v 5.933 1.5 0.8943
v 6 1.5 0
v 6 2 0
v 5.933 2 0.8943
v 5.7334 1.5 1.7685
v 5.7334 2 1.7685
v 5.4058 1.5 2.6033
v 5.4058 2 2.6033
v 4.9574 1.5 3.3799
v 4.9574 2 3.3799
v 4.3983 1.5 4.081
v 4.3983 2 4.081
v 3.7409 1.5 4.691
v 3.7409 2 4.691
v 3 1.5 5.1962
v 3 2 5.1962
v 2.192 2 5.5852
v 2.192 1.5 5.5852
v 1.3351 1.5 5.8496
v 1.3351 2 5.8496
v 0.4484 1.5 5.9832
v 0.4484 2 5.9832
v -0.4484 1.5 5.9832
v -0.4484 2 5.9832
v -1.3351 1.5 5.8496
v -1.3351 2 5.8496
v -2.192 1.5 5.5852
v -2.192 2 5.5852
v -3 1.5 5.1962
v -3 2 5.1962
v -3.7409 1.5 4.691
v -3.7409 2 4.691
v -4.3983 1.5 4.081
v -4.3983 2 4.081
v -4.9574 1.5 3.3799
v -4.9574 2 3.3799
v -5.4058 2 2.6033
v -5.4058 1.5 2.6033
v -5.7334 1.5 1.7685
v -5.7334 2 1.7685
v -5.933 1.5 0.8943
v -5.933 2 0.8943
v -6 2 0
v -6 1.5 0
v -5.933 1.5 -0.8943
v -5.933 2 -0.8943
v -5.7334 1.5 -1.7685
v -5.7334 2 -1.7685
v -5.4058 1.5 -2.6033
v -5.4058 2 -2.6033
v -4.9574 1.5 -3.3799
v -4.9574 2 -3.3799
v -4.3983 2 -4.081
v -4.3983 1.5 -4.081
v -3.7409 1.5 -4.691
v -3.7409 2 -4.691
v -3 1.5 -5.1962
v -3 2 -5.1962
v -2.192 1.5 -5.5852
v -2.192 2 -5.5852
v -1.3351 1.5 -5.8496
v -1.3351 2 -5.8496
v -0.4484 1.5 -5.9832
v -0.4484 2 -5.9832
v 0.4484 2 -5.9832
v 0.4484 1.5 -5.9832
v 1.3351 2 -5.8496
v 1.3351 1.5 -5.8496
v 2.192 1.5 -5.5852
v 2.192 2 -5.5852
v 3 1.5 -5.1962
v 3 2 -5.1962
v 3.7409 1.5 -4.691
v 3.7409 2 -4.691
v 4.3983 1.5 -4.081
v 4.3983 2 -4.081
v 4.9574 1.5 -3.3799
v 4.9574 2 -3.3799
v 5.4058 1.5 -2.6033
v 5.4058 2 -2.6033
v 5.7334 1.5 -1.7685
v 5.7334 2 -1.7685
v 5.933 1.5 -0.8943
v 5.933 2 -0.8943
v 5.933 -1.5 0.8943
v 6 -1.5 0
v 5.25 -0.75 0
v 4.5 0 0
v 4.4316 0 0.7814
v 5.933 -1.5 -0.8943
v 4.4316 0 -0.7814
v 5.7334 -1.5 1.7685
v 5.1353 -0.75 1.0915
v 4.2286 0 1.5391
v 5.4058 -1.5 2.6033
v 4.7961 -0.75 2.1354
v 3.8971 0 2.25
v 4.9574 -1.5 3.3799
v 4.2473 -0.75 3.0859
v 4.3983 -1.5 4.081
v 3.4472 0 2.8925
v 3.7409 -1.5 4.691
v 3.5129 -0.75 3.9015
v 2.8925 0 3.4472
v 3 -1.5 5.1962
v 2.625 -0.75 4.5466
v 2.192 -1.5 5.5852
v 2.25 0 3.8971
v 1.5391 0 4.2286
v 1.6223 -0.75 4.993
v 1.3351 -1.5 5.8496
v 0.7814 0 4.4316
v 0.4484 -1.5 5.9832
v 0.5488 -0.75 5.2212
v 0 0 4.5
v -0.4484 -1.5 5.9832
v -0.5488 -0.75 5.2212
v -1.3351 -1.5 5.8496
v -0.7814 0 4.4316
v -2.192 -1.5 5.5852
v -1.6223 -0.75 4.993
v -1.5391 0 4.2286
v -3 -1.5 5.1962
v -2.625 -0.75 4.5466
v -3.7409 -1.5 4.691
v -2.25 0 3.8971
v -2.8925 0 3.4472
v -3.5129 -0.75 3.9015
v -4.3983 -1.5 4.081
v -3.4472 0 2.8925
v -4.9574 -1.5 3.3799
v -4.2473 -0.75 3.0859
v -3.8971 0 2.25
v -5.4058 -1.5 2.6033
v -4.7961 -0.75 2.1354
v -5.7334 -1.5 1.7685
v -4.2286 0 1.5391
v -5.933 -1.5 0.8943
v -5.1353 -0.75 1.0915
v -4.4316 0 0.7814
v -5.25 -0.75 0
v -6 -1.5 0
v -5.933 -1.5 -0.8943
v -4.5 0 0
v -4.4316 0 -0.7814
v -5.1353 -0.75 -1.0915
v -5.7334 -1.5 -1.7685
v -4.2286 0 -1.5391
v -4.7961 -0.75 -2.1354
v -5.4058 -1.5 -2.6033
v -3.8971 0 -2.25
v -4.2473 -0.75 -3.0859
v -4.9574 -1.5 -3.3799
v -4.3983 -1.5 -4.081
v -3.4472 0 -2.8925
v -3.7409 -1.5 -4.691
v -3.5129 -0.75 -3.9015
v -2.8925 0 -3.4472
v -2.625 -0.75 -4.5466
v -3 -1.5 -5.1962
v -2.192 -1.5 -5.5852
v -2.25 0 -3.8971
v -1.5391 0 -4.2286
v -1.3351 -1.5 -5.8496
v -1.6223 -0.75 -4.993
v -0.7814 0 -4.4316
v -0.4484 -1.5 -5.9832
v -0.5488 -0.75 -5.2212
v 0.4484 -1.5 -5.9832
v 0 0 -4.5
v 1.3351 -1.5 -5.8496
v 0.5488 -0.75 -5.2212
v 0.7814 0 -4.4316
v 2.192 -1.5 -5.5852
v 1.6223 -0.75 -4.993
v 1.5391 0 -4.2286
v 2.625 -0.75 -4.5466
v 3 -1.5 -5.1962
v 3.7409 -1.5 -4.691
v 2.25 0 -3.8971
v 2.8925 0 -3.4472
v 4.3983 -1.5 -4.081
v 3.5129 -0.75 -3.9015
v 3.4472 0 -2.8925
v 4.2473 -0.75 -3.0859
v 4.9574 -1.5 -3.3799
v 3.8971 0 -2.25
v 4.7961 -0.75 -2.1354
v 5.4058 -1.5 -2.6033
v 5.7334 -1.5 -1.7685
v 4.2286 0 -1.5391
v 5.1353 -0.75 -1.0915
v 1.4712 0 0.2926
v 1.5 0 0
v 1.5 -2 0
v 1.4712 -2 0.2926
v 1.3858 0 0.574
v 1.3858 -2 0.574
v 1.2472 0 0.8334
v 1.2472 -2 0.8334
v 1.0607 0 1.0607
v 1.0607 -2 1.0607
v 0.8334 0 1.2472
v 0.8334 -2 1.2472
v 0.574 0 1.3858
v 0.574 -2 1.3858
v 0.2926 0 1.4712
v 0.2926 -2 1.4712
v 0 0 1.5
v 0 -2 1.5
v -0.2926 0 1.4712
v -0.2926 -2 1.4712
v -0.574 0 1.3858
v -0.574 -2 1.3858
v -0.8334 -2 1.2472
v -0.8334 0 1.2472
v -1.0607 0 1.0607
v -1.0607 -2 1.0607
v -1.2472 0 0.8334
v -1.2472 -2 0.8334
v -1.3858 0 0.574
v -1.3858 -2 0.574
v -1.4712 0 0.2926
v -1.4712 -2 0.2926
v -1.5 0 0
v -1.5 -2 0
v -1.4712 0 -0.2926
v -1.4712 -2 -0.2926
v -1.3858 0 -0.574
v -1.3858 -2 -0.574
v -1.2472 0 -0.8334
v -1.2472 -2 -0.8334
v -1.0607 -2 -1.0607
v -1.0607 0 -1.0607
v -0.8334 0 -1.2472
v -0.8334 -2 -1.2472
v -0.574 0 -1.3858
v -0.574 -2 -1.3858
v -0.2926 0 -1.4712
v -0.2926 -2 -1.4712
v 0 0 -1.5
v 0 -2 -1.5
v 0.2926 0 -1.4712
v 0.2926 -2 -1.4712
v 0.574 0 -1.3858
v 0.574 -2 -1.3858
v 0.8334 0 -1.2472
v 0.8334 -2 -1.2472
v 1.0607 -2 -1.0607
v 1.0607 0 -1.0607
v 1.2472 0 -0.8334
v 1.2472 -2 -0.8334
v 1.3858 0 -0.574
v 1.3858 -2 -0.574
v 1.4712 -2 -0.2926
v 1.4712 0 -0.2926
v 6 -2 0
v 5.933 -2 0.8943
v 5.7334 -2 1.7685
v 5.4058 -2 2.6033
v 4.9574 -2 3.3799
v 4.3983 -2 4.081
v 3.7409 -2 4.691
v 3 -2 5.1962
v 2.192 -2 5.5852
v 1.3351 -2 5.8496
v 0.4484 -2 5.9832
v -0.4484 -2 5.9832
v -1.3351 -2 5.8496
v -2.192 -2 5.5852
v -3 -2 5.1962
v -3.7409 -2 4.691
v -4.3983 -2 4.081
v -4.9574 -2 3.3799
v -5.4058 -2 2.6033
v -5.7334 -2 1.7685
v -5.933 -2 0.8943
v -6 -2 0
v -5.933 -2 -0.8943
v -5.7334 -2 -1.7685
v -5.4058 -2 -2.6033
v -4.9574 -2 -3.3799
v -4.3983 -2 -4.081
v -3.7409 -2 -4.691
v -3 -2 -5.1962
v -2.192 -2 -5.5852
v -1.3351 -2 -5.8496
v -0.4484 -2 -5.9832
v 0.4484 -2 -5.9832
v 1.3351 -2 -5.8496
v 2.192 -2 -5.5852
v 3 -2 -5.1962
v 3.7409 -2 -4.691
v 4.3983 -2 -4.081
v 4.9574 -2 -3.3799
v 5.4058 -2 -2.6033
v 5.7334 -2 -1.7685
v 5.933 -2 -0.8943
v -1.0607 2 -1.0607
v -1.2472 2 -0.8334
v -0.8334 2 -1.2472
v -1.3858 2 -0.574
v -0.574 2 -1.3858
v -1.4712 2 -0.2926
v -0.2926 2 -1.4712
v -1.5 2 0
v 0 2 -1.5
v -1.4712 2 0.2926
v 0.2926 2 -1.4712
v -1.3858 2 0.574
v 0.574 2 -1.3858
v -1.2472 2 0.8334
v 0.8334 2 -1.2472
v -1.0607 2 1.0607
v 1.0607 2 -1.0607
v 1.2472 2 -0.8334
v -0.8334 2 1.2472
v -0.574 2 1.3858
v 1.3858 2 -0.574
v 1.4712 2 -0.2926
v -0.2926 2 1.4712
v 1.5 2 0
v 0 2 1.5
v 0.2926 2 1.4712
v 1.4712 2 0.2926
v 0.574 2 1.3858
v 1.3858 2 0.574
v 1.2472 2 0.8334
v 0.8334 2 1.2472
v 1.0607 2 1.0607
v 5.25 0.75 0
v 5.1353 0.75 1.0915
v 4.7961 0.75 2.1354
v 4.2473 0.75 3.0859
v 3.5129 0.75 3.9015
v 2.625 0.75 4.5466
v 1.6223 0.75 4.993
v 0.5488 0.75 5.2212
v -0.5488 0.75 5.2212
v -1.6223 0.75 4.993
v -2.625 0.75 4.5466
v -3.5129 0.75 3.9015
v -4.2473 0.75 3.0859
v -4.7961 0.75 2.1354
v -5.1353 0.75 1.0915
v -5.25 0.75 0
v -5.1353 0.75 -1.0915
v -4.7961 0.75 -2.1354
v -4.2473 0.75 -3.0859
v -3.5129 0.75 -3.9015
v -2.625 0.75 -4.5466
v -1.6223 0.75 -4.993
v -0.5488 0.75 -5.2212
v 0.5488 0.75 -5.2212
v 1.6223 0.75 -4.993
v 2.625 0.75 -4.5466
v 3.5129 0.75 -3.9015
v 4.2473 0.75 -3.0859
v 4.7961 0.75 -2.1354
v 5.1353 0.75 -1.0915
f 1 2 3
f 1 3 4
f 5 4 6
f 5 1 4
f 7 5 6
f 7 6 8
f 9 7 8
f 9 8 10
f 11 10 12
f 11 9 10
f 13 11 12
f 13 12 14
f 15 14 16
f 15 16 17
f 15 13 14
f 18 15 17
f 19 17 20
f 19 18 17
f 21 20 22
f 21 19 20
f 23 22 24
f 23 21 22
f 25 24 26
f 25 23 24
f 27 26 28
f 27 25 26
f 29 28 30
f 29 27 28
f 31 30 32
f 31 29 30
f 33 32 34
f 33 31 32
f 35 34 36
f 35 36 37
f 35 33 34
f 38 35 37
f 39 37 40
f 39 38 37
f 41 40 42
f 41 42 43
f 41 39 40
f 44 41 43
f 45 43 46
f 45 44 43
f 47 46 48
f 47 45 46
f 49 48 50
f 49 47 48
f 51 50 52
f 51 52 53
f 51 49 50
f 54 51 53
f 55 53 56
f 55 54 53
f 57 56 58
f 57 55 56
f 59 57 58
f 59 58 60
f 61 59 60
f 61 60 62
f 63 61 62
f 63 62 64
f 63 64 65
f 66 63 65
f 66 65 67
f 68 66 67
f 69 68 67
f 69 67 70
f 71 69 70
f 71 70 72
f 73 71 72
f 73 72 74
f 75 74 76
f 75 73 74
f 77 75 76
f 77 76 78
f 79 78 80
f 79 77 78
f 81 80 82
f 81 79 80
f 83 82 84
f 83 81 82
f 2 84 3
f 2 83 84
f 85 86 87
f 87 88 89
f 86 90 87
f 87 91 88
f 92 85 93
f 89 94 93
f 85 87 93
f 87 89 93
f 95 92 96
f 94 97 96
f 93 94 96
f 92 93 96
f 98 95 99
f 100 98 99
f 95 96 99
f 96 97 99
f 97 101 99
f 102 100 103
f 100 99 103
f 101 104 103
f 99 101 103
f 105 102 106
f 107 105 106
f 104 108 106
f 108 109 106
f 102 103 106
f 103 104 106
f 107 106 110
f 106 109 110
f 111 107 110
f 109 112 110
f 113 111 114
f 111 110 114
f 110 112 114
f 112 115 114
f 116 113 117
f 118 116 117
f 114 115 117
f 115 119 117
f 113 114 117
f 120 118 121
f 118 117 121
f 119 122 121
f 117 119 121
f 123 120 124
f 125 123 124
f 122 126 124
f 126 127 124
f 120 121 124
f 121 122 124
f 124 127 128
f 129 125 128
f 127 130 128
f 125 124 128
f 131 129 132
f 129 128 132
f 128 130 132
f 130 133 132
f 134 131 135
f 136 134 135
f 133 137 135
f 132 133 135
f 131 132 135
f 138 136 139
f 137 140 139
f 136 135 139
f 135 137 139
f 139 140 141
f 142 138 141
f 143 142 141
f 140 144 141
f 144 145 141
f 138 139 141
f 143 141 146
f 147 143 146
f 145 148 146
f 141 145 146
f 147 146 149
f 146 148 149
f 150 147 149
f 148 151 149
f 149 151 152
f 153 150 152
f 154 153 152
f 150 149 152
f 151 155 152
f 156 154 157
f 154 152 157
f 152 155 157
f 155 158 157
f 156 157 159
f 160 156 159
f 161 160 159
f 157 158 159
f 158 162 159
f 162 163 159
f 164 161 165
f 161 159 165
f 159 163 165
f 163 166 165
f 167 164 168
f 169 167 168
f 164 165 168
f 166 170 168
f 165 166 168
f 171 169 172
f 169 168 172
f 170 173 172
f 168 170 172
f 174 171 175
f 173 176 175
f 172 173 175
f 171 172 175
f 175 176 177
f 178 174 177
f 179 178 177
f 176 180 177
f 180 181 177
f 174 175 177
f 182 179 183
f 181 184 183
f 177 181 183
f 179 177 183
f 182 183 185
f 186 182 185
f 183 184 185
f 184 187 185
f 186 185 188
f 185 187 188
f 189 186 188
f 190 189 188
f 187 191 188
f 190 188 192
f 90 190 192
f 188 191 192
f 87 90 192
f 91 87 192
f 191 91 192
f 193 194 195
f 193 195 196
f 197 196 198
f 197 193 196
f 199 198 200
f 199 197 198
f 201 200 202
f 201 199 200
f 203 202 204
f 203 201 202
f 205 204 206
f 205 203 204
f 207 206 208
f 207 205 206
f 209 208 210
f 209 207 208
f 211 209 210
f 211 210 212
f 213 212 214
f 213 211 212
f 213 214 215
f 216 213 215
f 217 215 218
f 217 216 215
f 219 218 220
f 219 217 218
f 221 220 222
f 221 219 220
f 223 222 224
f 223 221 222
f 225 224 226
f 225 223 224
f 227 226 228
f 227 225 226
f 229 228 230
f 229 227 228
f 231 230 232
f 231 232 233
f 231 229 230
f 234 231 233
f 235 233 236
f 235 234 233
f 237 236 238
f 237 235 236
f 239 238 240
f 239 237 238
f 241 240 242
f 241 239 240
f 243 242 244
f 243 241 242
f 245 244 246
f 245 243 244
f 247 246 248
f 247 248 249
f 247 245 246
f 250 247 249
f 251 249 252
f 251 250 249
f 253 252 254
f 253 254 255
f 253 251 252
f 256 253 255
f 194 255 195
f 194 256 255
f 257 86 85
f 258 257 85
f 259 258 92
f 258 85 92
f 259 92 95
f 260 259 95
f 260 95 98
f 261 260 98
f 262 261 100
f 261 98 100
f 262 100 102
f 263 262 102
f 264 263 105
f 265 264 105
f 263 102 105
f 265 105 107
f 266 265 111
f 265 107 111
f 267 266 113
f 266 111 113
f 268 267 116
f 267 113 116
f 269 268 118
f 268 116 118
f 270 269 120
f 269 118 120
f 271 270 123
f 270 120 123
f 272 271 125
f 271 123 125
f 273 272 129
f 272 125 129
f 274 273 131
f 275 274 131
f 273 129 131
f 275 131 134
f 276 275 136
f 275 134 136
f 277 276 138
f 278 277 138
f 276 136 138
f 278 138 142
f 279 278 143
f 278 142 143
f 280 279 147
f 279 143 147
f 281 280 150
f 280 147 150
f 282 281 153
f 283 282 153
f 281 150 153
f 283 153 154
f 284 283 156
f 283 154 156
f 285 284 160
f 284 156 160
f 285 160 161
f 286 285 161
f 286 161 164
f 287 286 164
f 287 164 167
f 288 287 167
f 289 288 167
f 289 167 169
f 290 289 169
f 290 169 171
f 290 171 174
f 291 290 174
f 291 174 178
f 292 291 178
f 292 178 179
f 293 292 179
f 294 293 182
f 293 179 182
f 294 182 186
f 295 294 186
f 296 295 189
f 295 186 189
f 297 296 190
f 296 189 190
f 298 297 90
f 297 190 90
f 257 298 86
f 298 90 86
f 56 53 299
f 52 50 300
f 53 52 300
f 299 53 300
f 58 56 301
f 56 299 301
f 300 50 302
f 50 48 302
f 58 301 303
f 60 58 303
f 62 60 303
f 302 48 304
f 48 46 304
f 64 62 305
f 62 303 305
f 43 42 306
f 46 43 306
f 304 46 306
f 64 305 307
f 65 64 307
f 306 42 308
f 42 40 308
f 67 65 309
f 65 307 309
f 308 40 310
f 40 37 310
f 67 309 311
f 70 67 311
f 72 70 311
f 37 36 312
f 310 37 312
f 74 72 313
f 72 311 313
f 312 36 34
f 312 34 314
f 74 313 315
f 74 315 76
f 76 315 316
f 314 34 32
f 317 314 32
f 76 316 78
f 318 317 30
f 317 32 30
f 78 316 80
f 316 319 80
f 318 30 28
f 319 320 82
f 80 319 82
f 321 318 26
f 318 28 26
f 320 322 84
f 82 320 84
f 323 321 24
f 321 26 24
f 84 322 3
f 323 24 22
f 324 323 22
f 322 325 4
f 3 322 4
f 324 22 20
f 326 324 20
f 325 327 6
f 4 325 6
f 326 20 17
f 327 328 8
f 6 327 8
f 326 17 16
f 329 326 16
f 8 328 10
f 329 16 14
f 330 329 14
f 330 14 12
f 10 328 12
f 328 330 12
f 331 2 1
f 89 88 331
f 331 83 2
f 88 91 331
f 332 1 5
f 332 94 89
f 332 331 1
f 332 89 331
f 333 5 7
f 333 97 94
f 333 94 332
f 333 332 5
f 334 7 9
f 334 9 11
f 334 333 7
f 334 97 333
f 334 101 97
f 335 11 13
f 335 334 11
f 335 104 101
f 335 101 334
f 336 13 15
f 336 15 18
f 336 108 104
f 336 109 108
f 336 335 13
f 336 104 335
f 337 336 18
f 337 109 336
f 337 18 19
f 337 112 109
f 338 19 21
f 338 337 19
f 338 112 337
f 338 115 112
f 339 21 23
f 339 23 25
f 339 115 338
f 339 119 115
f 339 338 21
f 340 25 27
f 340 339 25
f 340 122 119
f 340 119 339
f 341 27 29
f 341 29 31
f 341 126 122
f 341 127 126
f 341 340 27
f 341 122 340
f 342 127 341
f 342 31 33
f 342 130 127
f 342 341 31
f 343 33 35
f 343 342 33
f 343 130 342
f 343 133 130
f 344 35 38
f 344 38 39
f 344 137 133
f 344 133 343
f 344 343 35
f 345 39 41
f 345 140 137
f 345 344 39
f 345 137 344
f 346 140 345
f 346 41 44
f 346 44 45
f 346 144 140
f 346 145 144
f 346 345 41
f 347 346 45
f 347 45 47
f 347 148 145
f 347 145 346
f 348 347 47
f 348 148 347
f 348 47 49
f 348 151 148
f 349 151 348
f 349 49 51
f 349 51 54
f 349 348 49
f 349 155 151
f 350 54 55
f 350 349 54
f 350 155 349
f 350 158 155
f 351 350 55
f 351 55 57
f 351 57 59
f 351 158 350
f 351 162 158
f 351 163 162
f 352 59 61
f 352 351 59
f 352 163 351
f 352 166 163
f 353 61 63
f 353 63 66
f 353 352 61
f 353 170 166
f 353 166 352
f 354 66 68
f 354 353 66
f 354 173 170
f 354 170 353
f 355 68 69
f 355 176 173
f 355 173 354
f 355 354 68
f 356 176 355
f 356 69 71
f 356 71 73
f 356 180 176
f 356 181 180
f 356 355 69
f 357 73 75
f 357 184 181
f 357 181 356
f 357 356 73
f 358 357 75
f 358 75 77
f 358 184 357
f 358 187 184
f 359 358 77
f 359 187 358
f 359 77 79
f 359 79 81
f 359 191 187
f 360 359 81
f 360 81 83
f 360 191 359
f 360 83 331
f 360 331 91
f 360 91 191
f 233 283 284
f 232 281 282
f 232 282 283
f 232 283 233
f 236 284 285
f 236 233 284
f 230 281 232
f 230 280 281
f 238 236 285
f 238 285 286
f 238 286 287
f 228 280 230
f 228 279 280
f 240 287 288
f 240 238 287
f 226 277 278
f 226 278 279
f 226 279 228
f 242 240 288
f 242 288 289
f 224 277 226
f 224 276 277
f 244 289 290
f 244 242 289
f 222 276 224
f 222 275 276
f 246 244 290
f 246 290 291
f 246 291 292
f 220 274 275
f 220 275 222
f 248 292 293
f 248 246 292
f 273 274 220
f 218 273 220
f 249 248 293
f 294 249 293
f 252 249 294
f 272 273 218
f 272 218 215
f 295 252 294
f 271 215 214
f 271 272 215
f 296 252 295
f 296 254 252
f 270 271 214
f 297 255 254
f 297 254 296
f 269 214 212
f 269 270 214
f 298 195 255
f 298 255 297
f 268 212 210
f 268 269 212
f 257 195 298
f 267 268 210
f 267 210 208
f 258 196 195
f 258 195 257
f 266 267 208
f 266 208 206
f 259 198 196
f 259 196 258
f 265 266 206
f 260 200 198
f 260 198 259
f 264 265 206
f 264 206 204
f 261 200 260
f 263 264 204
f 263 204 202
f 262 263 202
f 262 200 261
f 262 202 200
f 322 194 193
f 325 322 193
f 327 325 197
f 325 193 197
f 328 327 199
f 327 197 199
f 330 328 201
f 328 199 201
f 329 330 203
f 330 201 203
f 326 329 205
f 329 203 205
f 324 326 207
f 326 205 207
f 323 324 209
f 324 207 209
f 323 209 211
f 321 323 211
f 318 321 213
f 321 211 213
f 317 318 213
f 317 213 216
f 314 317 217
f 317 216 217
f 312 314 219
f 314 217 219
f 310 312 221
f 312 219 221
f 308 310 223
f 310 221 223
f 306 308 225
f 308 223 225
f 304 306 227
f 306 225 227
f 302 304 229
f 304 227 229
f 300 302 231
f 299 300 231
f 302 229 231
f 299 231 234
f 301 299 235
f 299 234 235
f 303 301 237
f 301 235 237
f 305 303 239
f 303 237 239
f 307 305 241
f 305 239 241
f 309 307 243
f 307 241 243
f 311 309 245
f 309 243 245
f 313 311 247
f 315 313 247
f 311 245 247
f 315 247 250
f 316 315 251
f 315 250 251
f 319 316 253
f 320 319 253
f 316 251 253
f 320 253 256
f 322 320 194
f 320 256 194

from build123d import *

# Parameters (mm, degrees)
F0_R     = 6
F0_R_2   = 1.5
F1_DEPTH = 2
F2_SIZE  = 1.5


with BuildPart() as f1:
    # F0 (on Front) → F1 (new body)
    with BuildSketch(Plane.XZ):
        Circle(F0_R)
        Circle(F0_R_2, mode=Mode.SUBTRACT)
    extrude(amount=F1_DEPTH)

    # F2
    f2_edges = [f1.edges().sort_by_distance(p)[0] for p in [
        (-6, 0, 0),
    ]]
    chamfer(f2_edges, length=F2_SIZE)

    # F3: F1 across plane


with BuildPart() as f1_1:
    add(f1.part)
    add(f1.part.mirror(Plane.XZ))


solid = f1_1.part
